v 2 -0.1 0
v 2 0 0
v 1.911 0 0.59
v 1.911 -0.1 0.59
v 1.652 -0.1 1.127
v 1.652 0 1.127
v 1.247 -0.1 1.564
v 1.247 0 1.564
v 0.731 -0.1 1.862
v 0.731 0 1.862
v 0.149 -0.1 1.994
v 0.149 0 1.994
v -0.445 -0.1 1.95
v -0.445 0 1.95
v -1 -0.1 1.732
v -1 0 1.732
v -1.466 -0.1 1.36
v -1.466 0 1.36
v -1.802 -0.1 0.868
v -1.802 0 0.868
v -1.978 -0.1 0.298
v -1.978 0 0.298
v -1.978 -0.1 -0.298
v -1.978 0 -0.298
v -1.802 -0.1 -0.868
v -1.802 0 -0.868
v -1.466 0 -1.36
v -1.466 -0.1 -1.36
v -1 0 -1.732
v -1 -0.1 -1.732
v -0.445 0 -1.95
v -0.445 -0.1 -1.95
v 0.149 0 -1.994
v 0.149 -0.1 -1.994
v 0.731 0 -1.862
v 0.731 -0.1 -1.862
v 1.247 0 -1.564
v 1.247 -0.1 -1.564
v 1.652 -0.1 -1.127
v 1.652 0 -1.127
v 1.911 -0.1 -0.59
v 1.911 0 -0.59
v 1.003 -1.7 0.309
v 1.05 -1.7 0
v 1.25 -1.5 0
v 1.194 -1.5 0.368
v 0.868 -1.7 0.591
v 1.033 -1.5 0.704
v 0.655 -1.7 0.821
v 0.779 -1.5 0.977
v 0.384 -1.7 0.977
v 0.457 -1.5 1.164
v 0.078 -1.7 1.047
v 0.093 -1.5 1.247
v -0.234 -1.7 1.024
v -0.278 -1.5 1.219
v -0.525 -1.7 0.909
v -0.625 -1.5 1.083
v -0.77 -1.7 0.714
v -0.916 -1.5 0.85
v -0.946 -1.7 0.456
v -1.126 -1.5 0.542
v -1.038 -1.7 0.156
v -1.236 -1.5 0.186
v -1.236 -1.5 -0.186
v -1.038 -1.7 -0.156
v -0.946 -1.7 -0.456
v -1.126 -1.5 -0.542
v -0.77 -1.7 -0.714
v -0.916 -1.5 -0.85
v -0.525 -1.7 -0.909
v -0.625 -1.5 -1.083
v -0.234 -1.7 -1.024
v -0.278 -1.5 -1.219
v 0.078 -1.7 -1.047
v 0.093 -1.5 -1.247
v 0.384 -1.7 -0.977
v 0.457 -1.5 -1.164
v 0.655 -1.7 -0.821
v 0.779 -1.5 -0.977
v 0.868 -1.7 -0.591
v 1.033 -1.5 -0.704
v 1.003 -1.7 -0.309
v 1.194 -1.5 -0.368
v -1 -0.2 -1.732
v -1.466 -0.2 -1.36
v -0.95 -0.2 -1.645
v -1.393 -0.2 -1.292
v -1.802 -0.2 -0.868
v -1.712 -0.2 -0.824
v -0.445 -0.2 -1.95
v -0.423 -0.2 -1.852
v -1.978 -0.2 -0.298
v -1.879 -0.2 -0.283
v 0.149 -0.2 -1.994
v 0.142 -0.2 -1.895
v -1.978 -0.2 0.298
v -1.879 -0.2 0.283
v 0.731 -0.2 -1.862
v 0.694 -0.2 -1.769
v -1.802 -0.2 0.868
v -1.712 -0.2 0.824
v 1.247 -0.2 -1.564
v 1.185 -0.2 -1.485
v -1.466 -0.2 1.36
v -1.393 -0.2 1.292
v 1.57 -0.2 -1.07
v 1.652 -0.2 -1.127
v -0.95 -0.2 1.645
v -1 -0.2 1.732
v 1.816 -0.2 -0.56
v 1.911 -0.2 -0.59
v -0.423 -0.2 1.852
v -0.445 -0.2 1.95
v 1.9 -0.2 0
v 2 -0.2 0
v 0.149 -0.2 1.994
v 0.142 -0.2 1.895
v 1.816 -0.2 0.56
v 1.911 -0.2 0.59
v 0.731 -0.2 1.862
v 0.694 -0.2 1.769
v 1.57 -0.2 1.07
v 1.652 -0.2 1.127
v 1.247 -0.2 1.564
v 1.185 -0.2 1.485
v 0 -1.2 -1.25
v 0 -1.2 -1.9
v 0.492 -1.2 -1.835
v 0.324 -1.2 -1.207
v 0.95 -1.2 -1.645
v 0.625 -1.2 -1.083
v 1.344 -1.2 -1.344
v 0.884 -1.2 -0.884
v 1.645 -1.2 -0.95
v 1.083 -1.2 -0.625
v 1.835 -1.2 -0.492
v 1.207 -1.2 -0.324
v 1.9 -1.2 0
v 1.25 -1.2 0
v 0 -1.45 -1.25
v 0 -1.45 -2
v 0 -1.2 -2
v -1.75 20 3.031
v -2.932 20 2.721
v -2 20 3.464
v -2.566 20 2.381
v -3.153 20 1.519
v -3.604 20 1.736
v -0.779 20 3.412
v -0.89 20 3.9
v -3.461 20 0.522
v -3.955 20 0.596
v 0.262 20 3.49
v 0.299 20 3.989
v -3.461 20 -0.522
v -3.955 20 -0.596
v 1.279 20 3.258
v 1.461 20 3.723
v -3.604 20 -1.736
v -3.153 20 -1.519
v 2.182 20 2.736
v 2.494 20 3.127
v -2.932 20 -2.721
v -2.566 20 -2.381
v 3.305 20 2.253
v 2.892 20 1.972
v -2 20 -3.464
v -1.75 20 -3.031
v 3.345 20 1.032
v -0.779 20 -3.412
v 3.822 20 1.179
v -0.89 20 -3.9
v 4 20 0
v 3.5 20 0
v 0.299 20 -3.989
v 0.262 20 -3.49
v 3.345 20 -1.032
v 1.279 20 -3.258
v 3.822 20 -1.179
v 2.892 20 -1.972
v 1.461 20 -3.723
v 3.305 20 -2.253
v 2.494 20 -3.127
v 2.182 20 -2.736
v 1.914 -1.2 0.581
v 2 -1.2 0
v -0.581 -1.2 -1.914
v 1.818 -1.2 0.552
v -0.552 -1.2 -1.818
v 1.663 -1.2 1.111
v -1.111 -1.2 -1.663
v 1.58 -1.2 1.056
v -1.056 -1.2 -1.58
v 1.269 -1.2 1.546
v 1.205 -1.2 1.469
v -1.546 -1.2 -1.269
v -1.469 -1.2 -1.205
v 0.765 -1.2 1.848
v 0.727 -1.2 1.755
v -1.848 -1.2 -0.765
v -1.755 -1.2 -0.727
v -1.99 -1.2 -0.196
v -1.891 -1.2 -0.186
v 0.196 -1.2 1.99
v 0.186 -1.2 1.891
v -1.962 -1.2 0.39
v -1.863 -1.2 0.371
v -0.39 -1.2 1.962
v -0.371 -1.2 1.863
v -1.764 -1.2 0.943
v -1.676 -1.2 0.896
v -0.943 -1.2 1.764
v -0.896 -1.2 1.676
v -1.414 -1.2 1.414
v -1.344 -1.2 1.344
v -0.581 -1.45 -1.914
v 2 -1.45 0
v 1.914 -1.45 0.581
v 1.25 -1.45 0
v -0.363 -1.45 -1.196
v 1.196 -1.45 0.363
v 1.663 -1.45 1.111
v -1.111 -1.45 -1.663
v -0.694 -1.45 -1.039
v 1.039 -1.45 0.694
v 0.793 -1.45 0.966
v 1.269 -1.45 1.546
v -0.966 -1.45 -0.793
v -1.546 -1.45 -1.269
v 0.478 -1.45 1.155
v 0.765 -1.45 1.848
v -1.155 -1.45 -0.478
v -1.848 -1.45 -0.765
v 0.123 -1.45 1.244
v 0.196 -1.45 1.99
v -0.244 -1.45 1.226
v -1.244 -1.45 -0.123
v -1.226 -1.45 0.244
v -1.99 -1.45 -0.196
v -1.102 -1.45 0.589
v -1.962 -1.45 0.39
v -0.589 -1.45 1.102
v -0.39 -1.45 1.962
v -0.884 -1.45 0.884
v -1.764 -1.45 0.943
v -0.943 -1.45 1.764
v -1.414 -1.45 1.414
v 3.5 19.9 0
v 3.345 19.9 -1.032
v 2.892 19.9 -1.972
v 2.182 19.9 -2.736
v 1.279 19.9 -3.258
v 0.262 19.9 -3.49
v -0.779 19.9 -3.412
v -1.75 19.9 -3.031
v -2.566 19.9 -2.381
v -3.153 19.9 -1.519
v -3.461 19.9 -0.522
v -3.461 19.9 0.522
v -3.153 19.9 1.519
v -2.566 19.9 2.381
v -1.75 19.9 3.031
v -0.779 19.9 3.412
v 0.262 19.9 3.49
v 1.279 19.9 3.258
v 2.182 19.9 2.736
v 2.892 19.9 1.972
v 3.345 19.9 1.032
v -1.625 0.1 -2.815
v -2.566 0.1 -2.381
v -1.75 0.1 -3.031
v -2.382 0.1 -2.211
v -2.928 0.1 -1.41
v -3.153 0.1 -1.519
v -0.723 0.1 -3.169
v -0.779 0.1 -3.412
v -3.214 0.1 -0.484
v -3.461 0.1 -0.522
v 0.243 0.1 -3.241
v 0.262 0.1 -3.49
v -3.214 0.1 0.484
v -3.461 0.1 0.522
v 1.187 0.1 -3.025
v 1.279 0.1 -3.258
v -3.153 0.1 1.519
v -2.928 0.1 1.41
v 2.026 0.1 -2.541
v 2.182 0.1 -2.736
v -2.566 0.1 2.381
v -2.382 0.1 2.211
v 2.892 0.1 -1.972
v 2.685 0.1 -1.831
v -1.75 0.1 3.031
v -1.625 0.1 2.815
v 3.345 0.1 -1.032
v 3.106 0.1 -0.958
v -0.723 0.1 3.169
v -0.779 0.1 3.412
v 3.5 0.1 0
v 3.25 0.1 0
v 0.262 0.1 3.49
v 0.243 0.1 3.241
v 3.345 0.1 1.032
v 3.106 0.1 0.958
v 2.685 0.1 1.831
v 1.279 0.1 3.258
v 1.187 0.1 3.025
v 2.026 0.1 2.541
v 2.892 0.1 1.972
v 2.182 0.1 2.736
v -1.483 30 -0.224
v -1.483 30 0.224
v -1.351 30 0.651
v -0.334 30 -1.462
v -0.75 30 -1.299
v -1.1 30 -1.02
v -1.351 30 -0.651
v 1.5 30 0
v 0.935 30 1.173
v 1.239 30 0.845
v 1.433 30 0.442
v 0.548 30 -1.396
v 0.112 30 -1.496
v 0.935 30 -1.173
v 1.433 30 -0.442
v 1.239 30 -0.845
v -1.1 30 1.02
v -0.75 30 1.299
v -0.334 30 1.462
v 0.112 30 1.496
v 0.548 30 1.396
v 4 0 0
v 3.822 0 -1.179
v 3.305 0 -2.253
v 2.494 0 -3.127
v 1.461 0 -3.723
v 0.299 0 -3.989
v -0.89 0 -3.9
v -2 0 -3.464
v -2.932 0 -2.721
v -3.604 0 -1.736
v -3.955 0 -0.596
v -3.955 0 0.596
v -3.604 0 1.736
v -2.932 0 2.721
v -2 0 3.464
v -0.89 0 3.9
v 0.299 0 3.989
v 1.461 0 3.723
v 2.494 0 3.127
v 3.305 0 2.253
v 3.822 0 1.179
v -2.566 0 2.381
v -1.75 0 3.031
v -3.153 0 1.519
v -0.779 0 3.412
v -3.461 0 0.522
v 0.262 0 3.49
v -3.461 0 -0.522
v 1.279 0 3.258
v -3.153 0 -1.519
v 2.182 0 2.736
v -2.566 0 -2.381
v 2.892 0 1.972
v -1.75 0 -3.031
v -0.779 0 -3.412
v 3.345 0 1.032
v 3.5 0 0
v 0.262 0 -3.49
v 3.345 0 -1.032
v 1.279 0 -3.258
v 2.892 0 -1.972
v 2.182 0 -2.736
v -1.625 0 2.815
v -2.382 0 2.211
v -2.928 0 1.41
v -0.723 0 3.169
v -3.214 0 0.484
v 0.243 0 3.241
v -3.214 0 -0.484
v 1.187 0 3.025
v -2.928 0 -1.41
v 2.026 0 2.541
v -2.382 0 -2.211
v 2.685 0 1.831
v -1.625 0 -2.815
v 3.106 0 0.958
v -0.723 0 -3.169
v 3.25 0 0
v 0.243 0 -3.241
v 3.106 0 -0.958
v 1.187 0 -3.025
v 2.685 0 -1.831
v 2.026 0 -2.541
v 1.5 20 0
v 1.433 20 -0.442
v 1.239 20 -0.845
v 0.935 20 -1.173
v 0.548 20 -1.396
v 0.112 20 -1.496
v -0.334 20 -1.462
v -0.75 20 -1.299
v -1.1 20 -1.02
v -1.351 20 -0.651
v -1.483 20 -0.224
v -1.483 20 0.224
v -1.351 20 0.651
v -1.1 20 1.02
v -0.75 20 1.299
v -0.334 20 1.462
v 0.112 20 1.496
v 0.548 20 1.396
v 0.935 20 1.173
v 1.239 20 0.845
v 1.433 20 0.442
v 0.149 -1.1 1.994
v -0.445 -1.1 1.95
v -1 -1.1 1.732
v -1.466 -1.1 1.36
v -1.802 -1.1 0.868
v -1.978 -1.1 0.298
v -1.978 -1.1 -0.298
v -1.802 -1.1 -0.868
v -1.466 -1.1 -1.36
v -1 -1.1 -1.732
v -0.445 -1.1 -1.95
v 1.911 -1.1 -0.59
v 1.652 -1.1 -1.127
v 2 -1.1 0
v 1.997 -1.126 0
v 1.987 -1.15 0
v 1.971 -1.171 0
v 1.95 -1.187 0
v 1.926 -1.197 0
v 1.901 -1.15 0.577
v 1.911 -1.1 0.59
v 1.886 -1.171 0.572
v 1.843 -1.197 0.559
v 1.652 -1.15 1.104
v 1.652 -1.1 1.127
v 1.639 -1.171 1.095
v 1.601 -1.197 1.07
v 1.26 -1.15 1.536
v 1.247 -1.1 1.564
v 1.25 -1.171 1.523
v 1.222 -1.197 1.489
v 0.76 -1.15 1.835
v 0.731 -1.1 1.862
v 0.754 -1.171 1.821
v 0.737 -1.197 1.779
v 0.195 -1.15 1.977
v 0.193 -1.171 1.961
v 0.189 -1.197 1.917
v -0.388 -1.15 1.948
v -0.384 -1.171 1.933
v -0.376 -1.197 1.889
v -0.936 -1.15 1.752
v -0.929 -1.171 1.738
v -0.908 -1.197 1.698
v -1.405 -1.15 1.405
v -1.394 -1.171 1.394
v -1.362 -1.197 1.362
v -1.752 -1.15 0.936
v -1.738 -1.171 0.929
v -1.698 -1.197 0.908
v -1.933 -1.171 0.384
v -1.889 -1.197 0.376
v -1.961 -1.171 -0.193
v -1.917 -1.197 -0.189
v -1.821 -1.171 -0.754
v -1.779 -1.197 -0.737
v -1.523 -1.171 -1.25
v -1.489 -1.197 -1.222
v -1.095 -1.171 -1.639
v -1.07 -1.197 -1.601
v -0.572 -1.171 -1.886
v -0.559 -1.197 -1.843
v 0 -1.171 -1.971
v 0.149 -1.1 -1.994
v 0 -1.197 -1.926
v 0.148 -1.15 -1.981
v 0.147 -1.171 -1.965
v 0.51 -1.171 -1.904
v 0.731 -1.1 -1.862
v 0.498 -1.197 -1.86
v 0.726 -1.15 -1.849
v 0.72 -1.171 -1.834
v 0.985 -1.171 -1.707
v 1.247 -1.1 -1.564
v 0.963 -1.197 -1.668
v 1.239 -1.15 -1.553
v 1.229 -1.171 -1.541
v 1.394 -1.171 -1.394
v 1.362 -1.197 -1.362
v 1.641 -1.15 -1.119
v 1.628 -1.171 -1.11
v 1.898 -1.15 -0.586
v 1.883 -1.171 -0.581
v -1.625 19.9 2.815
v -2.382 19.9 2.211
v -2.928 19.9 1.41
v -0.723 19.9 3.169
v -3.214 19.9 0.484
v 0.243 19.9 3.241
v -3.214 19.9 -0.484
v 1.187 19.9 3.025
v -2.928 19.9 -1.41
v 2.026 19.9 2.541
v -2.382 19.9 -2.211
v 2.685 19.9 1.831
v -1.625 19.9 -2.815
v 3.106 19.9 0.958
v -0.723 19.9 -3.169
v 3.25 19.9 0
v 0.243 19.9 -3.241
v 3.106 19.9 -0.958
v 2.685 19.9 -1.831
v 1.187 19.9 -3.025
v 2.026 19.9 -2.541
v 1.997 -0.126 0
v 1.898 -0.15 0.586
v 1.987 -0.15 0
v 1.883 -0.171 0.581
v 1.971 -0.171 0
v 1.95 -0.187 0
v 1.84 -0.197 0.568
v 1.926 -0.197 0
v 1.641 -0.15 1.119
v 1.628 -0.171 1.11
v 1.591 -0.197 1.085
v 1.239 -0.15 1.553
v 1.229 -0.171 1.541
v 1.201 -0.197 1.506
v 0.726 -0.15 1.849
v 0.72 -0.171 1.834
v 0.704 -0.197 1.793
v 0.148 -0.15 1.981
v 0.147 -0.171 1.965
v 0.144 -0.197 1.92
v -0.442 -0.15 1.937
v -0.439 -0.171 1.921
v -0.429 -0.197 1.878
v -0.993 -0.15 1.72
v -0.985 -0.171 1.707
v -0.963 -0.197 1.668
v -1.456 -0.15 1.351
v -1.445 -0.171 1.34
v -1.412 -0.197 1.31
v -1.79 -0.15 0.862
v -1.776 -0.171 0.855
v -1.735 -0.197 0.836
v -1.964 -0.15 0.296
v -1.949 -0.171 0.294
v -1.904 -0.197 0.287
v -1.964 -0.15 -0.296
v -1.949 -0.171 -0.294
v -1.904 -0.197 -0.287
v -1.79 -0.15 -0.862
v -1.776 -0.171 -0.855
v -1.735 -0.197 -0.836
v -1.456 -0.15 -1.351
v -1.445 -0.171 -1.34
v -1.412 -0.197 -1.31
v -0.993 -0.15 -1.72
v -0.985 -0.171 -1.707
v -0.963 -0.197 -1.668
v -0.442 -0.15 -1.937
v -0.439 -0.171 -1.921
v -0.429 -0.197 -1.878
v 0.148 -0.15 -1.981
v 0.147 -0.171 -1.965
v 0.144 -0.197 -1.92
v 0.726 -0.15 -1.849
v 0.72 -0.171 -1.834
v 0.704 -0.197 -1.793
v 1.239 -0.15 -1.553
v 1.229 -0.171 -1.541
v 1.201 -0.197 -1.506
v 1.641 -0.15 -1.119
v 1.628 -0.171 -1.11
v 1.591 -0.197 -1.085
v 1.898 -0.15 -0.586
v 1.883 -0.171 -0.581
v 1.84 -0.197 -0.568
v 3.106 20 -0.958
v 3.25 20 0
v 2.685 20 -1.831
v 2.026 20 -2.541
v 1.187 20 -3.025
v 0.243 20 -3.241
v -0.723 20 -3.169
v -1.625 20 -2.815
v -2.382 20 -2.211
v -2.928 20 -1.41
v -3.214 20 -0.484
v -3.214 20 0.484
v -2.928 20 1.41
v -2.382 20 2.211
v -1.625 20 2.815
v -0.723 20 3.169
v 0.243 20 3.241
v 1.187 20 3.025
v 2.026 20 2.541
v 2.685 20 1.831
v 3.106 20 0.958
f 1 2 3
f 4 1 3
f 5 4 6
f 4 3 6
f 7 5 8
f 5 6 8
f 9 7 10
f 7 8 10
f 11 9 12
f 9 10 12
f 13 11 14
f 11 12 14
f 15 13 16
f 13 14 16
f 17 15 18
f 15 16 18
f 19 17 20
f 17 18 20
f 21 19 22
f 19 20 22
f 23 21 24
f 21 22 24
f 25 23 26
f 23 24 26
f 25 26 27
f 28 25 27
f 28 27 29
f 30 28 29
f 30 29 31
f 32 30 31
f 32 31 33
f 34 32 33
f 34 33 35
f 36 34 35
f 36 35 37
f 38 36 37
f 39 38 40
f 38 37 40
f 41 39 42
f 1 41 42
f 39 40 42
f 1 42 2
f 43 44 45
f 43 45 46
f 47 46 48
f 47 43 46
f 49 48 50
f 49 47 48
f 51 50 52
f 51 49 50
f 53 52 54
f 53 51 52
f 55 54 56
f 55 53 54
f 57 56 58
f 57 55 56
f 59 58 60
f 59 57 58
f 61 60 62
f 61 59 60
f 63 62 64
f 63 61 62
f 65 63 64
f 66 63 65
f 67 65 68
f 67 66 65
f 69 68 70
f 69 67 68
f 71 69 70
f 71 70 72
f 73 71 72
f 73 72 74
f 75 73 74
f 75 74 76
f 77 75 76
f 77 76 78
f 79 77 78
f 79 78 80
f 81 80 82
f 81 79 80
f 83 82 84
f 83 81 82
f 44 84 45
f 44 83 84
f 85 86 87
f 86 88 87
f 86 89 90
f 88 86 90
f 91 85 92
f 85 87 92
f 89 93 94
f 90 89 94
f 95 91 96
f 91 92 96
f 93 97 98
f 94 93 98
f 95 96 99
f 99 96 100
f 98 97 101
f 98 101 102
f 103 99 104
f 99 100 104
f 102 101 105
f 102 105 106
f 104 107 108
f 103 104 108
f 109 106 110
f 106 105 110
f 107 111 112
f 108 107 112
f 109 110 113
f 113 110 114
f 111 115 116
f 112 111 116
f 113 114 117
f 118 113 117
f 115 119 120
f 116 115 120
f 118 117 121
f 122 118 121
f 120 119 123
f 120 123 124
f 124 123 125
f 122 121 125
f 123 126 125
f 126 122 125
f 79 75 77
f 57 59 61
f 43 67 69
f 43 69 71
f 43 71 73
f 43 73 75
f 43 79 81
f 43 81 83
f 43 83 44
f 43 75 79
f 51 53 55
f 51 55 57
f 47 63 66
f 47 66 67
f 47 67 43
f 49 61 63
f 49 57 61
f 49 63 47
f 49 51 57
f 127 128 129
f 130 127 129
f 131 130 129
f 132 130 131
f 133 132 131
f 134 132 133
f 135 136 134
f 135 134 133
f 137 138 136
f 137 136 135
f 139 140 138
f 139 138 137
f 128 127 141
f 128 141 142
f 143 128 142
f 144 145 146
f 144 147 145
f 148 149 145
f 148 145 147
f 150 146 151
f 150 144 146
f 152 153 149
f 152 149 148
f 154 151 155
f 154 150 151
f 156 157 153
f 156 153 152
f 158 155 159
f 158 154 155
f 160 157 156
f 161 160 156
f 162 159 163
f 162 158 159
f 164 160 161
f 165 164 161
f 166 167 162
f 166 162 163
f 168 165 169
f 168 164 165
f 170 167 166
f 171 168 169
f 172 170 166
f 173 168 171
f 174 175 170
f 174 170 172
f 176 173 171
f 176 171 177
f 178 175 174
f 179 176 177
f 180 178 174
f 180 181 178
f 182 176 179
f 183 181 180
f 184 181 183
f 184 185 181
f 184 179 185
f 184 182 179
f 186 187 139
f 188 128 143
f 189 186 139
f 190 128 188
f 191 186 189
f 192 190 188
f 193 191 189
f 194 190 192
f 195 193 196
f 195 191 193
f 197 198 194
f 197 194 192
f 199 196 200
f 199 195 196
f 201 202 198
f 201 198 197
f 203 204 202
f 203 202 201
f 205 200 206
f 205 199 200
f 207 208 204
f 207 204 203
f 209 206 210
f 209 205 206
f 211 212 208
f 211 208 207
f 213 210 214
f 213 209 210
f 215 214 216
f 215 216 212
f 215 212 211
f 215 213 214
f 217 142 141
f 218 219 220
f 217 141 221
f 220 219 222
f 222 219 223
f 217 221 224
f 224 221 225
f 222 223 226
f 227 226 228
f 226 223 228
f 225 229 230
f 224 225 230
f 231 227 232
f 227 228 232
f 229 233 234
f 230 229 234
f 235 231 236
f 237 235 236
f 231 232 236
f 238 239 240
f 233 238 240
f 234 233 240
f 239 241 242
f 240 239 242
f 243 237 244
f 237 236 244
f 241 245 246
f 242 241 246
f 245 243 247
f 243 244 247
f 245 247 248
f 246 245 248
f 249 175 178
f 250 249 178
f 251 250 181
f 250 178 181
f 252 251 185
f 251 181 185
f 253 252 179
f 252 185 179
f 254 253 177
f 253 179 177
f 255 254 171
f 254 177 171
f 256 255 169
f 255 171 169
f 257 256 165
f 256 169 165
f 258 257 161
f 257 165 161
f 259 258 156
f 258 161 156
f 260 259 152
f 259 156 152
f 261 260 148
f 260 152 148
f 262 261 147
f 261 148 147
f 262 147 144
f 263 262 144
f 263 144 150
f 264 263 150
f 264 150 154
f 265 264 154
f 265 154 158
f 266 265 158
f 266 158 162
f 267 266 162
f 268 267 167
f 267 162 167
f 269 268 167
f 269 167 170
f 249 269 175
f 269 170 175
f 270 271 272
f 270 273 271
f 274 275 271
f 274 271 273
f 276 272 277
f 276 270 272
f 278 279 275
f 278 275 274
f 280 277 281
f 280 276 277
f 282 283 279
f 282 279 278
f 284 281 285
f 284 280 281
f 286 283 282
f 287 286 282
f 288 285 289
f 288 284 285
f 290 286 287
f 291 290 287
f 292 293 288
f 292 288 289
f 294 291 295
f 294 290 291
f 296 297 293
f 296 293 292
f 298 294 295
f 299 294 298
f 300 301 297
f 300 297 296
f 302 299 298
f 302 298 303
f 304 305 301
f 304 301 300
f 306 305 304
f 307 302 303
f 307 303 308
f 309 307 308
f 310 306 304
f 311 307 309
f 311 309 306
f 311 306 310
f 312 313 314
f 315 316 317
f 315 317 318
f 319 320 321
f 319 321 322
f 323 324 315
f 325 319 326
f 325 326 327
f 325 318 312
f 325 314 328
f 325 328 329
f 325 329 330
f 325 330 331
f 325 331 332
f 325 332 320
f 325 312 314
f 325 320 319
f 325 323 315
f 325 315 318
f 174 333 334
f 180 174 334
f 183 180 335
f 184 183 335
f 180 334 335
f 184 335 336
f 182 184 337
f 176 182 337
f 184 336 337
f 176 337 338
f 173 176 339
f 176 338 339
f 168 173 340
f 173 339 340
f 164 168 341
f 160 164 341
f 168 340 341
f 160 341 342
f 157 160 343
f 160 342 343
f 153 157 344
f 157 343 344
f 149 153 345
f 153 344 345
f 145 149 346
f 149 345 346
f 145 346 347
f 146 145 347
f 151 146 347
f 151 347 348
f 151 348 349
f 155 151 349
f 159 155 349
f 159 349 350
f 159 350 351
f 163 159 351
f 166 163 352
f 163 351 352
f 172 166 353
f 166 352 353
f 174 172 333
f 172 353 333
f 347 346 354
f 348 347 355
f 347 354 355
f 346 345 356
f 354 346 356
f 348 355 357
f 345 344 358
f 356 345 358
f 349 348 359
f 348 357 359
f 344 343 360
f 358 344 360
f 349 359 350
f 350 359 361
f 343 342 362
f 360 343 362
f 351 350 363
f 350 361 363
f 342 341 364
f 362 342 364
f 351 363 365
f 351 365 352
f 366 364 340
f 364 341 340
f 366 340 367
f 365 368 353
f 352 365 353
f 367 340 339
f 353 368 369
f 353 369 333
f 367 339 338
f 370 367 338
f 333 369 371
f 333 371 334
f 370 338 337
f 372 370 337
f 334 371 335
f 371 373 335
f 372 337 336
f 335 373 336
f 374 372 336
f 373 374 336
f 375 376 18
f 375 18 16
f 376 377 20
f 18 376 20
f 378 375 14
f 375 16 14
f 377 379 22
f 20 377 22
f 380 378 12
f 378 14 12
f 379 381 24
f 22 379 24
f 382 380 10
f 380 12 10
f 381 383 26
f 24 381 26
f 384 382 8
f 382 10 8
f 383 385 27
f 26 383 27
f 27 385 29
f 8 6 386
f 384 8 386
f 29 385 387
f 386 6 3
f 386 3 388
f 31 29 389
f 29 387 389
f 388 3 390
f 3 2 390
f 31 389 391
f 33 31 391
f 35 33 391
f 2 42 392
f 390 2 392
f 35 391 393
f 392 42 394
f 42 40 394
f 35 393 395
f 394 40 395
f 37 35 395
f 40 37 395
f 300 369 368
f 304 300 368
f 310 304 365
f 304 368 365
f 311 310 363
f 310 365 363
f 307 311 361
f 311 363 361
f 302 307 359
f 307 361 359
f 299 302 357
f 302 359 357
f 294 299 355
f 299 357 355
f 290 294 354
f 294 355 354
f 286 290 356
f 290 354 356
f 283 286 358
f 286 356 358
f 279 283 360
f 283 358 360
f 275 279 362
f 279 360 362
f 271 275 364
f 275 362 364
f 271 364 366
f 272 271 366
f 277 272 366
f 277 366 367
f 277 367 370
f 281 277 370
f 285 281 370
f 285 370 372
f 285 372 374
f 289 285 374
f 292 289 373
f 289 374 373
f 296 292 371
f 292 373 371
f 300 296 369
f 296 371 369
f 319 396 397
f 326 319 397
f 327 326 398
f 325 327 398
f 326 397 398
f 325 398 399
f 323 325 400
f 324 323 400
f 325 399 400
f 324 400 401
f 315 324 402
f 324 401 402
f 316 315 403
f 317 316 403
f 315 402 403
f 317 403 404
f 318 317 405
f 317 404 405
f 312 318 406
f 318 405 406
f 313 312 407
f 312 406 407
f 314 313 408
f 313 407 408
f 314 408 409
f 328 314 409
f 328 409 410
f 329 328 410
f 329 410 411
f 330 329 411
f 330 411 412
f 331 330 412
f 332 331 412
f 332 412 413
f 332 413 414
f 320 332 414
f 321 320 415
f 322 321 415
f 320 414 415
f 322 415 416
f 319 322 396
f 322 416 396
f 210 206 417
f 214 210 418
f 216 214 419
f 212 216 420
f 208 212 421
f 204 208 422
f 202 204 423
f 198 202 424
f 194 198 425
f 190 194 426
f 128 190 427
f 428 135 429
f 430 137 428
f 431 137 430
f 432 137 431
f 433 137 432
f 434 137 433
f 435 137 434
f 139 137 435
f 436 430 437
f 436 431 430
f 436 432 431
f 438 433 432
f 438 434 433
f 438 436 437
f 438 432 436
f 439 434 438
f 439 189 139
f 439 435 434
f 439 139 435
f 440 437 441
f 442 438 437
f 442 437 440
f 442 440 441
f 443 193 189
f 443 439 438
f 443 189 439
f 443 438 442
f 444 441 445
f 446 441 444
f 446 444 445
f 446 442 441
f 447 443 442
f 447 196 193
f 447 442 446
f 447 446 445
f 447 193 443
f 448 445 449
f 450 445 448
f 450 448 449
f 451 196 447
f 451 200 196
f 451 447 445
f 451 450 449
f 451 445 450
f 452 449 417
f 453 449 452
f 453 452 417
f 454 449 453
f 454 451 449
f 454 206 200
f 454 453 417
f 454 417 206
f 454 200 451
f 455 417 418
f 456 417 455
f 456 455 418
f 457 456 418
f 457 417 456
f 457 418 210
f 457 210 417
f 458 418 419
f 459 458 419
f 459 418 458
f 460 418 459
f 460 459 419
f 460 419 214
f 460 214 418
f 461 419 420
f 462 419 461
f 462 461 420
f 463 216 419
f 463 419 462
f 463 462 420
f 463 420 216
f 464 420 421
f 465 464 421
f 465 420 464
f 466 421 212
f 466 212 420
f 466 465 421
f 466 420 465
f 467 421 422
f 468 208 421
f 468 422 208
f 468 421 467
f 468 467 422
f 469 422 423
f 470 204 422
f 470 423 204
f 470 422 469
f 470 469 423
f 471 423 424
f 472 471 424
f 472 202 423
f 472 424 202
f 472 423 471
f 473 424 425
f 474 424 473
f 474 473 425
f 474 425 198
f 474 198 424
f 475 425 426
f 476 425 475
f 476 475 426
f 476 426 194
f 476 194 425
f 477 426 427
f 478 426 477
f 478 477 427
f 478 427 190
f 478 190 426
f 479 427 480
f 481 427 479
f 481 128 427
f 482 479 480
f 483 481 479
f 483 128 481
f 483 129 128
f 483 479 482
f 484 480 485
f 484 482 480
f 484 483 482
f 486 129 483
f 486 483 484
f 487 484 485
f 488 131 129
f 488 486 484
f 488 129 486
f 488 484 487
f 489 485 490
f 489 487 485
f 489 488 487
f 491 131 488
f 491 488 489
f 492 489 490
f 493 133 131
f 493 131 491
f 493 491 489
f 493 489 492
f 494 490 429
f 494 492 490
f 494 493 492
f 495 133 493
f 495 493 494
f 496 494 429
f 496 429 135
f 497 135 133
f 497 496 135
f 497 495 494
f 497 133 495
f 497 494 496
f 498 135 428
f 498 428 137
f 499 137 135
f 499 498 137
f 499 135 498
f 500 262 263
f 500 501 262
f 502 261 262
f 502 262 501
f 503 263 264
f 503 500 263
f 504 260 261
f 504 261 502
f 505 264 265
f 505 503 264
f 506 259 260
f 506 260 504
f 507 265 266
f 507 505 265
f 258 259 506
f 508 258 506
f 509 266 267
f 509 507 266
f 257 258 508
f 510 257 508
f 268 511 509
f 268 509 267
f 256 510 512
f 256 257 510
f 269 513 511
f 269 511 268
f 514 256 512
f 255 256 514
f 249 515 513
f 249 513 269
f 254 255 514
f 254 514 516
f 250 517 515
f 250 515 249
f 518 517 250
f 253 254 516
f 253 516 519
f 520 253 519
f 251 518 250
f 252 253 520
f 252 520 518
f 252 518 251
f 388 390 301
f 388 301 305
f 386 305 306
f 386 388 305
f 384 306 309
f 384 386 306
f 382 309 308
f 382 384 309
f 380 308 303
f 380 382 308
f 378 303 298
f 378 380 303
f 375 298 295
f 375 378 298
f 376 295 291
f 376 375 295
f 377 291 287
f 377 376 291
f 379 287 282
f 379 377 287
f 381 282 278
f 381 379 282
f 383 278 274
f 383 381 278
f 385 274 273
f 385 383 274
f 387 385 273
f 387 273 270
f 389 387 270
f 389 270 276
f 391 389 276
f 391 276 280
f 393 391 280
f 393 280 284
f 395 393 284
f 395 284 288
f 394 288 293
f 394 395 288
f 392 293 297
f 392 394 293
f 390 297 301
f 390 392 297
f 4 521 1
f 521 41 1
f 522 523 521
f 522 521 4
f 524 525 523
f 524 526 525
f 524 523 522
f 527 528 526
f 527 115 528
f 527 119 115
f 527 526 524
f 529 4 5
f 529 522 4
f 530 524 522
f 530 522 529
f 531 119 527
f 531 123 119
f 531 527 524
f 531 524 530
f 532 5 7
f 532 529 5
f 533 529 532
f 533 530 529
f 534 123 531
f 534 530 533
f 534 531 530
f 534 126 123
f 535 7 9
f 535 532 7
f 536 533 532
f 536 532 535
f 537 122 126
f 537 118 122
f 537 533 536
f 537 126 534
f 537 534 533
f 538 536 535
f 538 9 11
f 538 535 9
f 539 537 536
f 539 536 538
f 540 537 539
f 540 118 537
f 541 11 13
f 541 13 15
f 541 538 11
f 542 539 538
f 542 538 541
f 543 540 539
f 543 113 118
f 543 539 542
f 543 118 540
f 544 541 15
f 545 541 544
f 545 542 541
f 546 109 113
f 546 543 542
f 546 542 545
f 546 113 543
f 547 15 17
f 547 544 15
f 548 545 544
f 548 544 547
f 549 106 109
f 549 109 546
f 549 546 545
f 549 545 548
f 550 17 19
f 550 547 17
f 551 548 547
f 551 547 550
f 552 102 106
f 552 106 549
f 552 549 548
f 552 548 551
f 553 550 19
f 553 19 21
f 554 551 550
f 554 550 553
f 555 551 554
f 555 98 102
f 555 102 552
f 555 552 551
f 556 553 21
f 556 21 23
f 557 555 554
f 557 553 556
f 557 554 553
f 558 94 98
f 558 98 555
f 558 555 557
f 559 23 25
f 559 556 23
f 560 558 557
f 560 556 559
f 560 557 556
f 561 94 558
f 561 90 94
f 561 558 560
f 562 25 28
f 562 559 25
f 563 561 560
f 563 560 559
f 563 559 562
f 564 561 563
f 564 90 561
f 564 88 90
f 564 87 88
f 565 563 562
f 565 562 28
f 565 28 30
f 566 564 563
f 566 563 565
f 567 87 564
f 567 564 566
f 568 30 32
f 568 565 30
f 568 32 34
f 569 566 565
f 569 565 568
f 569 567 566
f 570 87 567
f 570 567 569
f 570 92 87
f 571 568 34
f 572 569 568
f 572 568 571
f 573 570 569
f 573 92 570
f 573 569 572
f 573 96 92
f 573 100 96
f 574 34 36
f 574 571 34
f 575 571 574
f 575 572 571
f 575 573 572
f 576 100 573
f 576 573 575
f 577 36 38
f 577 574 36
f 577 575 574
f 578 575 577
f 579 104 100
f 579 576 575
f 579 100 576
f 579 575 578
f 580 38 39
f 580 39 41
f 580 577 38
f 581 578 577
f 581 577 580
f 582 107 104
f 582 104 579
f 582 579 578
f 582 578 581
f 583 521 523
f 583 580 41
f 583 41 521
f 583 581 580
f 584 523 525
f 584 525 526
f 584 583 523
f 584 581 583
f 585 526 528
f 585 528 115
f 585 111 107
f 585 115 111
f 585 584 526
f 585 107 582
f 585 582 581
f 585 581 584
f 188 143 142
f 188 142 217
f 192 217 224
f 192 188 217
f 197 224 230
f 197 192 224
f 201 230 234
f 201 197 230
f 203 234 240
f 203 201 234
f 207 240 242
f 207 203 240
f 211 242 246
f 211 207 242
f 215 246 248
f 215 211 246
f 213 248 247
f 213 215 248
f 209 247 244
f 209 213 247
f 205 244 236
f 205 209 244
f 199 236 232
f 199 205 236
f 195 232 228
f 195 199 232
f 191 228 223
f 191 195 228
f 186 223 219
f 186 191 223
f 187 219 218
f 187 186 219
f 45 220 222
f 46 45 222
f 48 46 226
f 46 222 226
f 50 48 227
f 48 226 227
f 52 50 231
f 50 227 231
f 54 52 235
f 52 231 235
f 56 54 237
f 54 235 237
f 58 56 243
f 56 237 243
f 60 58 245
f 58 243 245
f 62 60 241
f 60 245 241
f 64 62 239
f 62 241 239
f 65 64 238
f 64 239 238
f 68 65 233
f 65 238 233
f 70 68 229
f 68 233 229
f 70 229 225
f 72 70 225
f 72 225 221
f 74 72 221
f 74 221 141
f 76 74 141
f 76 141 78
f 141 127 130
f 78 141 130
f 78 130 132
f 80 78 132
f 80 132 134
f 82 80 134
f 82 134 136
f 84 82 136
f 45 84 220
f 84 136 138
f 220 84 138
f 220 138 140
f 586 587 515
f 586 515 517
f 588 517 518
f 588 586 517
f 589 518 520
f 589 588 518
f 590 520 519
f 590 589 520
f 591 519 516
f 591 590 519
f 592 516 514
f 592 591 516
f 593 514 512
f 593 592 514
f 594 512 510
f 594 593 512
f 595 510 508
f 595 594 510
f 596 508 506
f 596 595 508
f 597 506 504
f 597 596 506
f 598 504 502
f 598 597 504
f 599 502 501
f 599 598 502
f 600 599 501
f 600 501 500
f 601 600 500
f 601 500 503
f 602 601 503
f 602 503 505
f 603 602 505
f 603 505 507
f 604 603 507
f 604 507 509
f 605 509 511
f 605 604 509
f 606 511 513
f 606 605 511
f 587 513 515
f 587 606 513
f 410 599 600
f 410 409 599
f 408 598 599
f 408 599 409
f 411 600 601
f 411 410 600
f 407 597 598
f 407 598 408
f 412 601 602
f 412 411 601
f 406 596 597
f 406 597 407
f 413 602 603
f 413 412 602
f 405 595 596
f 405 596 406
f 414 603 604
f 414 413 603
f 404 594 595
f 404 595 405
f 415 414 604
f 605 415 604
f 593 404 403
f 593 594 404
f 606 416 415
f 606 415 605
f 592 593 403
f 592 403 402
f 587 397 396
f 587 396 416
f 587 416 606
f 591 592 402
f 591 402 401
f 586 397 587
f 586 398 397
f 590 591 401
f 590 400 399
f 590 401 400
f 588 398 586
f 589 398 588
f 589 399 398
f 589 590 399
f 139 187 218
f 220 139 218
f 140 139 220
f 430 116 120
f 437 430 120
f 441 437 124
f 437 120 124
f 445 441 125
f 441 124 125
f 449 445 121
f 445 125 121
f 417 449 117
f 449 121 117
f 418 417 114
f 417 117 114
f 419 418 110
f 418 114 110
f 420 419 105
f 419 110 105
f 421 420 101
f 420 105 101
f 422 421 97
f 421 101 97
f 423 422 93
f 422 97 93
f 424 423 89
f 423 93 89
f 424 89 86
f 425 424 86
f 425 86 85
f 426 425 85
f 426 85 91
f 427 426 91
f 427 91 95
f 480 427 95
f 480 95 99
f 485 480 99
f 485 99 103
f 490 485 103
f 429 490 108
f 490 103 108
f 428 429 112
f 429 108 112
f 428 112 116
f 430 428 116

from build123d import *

# Parameters (mm, degrees)
SKETCH1_R               = 4
BOSS_EXTRUDE1_DEPTH     = 20
SKETCH2_R               = 3.5
SKETCH2_R_2             = 3.25
CUT_EXTRUDE_THIN1_DEPTH = 0.1
SKETCH3_R               = 2
BOSS_EXTRUDE2_DEPTH     = 0.2
FILLET1_R               = 0.1
SKETCH4_R               = 2
BOSS_EXTRUDE3_DEPTH     = 1
FILLET2_R               = 0.1
SKETCH5_R               = 1.25
BOSS_EXTRUDE4_DEPTH     = 0.5
CHAMFER1_SIZE           = 0.2
BOSS_EXTRUDE5_DEPTH     = 0.25
SKETCH7_R               = 1.5
BOSS_EXTRUDE6_DEPTH     = 10
SKETCH8_R               = 3.5
SKETCH8_R_2             = 3.25
CUT_EXTRUDE_THIN2_DEPTH = 0.1


with BuildPart() as part:
    # Sketch1 → Boss-Extrude1 (new body)
    with BuildSketch(Plane(origin=(0, 0, 0), x_dir=(1, 0, 0), z_dir=(0, 1, 0))):
        Circle(SKETCH1_R)
    extrude(amount=BOSS_EXTRUDE1_DEPTH)

    # Sketch2 → Cut-Extrude-Thin1 (cut)
    with BuildSketch(Plane.XZ):
        Circle(SKETCH2_R)
        Circle(SKETCH2_R_2, mode=Mode.SUBTRACT)
    extrude(amount=-CUT_EXTRUDE_THIN1_DEPTH, mode=Mode.SUBTRACT)

    # Sketch3 → Boss-Extrude2 (add)
    with BuildSketch(Plane.XZ):
        Circle(SKETCH3_R)
    extrude(amount=BOSS_EXTRUDE2_DEPTH)

    # Fillet1
    fillet1_edges = [part.edges().sort_by_distance(p)[0] for p in [
        (-2, -0.2, 0),
    ]]
    fillet(fillet1_edges, radius=FILLET1_R)

    # Sketch4 → Boss-Extrude3 (add)
    with BuildSketch(Plane.XZ.offset(0.2)):
        Circle(SKETCH4_R)
    extrude(amount=BOSS_EXTRUDE3_DEPTH)

    # Fillet2
    fillet2_edges = [part.edges().sort_by_distance(p)[0] for p in [
        (-2, -1.2, 0),
    ]]
    fillet(fillet2_edges, radius=FILLET2_R)

    # Sketch5 → Boss-Extrude4 (add)
    with BuildSketch(Plane.XZ.offset(1.2)):
        Circle(SKETCH5_R)
    extrude(amount=BOSS_EXTRUDE4_DEPTH)

    # Chamfer1
    chamfer1_edges = [part.edges().sort_by_distance(p)[0] for p in [
        (-1.25, -1.7, 0),
    ]]
    chamfer(chamfer1_edges, length=CHAMFER1_SIZE)

    # Sketch6 → Boss-Extrude5 (add)
    with BuildSketch(Plane.XZ.offset(1.2)):
        with BuildLine():
            Line((0, -1.25), (0, -2))
            ThreePointArc((0, -2), (-1.414213562, 1.414213562), (2, 0))
            Line((2, 0), (1.25, 0))
            ThreePointArc((1.25, 0), (-0.883883476, 0.883883476), (0, -1.25))
        make_face()
    extrude(amount=BOSS_EXTRUDE5_DEPTH)

    # Sketch7 → Boss-Extrude6 (add)
    with BuildSketch(Plane(origin=(0, 20, 0), x_dir=(1, 0, 0), z_dir=(0, 1, 0))):
        Circle(SKETCH7_R)
    extrude(amount=BOSS_EXTRUDE6_DEPTH)

    # Sketch8 → Cut-Extrude-Thin2 (cut)
    with BuildSketch(Plane(origin=(0, 20, 0), x_dir=(1, 0, 0), z_dir=(0, 1, 0))):
        Circle(SKETCH8_R)
        Circle(SKETCH8_R_2, mode=Mode.SUBTRACT)
    extrude(amount=-CUT_EXTRUDE_THIN2_DEPTH, mode=Mode.SUBTRACT)


solid = part.part
